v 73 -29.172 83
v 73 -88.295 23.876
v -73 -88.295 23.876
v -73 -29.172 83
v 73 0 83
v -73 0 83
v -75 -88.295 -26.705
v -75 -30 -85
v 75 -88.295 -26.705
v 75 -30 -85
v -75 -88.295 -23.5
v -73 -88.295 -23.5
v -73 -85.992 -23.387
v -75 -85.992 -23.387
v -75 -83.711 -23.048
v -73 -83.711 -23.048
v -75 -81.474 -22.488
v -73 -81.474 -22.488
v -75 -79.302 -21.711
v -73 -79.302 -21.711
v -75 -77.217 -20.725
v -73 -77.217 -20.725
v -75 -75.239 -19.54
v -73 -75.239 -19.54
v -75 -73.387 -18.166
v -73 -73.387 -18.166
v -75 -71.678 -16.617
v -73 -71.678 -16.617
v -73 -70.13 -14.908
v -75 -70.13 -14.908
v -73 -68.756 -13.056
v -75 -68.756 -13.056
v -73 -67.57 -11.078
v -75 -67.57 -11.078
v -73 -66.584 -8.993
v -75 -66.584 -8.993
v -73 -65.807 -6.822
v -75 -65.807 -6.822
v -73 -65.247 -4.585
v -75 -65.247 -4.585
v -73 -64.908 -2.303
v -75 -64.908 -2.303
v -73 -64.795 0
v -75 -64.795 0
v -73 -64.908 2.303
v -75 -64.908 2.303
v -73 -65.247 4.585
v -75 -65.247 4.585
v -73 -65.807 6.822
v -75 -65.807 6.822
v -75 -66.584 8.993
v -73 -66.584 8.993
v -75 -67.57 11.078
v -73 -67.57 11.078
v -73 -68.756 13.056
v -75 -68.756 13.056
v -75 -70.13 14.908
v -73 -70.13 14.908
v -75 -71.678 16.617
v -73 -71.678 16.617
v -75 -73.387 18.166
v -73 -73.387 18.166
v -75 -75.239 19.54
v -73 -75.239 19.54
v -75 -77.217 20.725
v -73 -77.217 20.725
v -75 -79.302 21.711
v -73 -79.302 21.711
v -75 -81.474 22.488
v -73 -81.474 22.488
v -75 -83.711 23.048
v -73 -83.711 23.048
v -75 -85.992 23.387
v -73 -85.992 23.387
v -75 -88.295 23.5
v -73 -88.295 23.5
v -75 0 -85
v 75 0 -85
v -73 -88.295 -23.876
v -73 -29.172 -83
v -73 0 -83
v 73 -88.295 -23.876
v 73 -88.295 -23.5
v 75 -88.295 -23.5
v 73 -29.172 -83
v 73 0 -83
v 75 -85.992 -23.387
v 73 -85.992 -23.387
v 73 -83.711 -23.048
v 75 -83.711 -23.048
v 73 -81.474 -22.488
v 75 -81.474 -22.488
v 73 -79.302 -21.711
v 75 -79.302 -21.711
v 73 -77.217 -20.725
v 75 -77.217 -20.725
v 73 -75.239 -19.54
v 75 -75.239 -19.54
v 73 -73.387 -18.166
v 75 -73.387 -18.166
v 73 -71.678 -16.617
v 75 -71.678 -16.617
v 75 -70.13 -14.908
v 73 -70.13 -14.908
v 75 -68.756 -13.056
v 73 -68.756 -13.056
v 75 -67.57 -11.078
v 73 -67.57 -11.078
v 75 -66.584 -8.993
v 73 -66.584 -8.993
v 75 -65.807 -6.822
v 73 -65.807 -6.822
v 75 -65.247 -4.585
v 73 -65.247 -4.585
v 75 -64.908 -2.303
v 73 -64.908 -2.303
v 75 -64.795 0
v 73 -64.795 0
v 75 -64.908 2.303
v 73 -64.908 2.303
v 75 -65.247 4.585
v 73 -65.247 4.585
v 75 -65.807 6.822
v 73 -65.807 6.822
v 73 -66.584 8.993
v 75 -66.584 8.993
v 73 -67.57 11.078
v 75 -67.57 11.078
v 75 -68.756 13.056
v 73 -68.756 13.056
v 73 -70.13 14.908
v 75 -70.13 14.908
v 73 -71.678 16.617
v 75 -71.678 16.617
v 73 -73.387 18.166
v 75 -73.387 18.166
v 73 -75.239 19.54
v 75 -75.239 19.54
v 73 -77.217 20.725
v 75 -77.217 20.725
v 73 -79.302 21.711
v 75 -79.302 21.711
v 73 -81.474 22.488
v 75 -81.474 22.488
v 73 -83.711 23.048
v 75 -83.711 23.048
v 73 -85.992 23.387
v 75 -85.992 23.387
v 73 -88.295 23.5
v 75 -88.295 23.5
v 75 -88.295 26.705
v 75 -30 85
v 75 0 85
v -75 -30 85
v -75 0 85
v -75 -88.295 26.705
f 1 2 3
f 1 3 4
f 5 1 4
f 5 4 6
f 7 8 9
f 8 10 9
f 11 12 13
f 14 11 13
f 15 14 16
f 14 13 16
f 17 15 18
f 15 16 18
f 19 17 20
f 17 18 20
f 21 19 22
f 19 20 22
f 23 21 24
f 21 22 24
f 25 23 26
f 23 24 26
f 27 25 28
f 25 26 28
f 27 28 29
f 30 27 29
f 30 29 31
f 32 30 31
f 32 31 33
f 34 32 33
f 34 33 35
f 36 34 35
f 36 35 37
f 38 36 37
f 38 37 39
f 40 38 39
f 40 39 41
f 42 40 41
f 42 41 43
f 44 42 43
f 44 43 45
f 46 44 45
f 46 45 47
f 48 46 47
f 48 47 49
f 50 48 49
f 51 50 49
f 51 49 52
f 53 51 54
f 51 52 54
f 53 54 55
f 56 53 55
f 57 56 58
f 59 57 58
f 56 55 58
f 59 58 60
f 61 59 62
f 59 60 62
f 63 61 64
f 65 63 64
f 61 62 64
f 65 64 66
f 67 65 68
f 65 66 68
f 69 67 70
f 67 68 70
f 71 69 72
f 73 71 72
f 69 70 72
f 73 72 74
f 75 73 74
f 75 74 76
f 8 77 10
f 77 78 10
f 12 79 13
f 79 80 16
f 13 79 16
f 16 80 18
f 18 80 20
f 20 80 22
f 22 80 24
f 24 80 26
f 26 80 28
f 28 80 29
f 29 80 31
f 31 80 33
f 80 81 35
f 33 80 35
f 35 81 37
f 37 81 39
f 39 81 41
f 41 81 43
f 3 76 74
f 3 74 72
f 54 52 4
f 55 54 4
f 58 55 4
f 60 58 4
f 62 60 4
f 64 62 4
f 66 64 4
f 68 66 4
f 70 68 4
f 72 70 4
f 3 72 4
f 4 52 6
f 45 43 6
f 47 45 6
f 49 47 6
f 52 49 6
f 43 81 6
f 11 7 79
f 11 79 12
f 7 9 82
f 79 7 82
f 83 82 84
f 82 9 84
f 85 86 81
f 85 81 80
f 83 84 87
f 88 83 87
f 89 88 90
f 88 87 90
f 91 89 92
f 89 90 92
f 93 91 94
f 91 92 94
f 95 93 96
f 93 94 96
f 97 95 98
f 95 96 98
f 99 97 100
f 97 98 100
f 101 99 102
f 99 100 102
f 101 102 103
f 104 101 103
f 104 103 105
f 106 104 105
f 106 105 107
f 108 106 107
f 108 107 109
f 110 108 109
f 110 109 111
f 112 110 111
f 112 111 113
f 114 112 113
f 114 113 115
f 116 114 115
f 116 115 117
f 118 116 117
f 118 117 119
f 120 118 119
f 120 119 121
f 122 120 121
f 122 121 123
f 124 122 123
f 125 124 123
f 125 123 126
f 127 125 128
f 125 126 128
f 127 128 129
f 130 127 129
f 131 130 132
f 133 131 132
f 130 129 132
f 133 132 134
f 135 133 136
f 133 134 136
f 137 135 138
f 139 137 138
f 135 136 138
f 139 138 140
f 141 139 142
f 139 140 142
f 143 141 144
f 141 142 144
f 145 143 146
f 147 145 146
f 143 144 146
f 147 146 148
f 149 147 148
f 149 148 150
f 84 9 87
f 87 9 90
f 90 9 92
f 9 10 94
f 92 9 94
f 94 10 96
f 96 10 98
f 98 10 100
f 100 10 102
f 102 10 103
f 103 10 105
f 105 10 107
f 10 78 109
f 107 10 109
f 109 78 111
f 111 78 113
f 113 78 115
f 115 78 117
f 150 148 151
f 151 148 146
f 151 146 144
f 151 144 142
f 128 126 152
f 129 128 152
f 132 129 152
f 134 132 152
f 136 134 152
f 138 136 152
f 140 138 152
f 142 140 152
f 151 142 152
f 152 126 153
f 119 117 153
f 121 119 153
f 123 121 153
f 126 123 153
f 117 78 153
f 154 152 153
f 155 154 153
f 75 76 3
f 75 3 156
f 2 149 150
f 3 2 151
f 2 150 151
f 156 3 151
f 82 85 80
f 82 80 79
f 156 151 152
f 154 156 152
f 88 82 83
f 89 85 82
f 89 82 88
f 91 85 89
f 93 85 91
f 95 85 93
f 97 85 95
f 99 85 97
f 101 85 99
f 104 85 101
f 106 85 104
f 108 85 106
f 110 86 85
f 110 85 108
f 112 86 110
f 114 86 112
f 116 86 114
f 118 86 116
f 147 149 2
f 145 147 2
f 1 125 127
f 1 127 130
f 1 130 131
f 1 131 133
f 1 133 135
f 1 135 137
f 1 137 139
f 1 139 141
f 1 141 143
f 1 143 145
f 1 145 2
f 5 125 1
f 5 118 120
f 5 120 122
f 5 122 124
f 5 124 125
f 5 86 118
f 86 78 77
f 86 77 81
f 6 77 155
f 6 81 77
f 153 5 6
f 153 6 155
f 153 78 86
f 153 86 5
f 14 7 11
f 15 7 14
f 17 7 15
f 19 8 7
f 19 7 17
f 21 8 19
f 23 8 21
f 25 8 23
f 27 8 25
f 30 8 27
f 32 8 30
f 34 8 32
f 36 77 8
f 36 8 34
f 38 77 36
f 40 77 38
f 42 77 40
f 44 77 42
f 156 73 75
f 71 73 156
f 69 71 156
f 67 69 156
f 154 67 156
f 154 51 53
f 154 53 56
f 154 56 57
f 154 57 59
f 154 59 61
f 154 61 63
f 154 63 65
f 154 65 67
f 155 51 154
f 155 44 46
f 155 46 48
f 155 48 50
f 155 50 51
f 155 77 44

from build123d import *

# Parameters (mm, degrees)
EXTRUDE_1_DEPTH     = 75
SHELL_1_T           = -2
SKETCH_2_R          = 23.5
CUT_EXTRUDE_1_DEPTH = 194.70352352


with BuildPart() as part:
    # 草图1 → 凸台-拉伸1 (new, symmetric)
    with BuildSketch(Plane(origin=(0, 0, 0), x_dir=(0, 0, -1), z_dir=(1, 0, 0))):
        Polygon((0, 0), (85, 0), (85, -30), (26.704728189, -88.295271811), (-26.704728189, -88.295271811), (-85, -30), (-85, 0), align=None)
    extrude(amount=EXTRUDE_1_DEPTH, both=True)

    # 抽壳1
    shell_1_openings = [part.faces().sort_by_distance(p)[0] for p in [
        (0, 0, 0),
        (0, -88.295271811, 0),
    ]]
    offset(amount=SHELL_1_T, openings=shell_1_openings, kind=Kind.INTERSECTION)

    # 草图2 → 切除-拉伸1 (cut, through all)
    with BuildSketch(Plane(origin=(75, 0, 0), x_dir=(0, 0, -1), z_dir=(1, 0, 0))):
        with Locations((0, -88.295271811)):
            Circle(SKETCH_2_R)
    extrude(amount=-CUT_EXTRUDE_1_DEPTH, mode=Mode.SUBTRACT)


solid = part.part
